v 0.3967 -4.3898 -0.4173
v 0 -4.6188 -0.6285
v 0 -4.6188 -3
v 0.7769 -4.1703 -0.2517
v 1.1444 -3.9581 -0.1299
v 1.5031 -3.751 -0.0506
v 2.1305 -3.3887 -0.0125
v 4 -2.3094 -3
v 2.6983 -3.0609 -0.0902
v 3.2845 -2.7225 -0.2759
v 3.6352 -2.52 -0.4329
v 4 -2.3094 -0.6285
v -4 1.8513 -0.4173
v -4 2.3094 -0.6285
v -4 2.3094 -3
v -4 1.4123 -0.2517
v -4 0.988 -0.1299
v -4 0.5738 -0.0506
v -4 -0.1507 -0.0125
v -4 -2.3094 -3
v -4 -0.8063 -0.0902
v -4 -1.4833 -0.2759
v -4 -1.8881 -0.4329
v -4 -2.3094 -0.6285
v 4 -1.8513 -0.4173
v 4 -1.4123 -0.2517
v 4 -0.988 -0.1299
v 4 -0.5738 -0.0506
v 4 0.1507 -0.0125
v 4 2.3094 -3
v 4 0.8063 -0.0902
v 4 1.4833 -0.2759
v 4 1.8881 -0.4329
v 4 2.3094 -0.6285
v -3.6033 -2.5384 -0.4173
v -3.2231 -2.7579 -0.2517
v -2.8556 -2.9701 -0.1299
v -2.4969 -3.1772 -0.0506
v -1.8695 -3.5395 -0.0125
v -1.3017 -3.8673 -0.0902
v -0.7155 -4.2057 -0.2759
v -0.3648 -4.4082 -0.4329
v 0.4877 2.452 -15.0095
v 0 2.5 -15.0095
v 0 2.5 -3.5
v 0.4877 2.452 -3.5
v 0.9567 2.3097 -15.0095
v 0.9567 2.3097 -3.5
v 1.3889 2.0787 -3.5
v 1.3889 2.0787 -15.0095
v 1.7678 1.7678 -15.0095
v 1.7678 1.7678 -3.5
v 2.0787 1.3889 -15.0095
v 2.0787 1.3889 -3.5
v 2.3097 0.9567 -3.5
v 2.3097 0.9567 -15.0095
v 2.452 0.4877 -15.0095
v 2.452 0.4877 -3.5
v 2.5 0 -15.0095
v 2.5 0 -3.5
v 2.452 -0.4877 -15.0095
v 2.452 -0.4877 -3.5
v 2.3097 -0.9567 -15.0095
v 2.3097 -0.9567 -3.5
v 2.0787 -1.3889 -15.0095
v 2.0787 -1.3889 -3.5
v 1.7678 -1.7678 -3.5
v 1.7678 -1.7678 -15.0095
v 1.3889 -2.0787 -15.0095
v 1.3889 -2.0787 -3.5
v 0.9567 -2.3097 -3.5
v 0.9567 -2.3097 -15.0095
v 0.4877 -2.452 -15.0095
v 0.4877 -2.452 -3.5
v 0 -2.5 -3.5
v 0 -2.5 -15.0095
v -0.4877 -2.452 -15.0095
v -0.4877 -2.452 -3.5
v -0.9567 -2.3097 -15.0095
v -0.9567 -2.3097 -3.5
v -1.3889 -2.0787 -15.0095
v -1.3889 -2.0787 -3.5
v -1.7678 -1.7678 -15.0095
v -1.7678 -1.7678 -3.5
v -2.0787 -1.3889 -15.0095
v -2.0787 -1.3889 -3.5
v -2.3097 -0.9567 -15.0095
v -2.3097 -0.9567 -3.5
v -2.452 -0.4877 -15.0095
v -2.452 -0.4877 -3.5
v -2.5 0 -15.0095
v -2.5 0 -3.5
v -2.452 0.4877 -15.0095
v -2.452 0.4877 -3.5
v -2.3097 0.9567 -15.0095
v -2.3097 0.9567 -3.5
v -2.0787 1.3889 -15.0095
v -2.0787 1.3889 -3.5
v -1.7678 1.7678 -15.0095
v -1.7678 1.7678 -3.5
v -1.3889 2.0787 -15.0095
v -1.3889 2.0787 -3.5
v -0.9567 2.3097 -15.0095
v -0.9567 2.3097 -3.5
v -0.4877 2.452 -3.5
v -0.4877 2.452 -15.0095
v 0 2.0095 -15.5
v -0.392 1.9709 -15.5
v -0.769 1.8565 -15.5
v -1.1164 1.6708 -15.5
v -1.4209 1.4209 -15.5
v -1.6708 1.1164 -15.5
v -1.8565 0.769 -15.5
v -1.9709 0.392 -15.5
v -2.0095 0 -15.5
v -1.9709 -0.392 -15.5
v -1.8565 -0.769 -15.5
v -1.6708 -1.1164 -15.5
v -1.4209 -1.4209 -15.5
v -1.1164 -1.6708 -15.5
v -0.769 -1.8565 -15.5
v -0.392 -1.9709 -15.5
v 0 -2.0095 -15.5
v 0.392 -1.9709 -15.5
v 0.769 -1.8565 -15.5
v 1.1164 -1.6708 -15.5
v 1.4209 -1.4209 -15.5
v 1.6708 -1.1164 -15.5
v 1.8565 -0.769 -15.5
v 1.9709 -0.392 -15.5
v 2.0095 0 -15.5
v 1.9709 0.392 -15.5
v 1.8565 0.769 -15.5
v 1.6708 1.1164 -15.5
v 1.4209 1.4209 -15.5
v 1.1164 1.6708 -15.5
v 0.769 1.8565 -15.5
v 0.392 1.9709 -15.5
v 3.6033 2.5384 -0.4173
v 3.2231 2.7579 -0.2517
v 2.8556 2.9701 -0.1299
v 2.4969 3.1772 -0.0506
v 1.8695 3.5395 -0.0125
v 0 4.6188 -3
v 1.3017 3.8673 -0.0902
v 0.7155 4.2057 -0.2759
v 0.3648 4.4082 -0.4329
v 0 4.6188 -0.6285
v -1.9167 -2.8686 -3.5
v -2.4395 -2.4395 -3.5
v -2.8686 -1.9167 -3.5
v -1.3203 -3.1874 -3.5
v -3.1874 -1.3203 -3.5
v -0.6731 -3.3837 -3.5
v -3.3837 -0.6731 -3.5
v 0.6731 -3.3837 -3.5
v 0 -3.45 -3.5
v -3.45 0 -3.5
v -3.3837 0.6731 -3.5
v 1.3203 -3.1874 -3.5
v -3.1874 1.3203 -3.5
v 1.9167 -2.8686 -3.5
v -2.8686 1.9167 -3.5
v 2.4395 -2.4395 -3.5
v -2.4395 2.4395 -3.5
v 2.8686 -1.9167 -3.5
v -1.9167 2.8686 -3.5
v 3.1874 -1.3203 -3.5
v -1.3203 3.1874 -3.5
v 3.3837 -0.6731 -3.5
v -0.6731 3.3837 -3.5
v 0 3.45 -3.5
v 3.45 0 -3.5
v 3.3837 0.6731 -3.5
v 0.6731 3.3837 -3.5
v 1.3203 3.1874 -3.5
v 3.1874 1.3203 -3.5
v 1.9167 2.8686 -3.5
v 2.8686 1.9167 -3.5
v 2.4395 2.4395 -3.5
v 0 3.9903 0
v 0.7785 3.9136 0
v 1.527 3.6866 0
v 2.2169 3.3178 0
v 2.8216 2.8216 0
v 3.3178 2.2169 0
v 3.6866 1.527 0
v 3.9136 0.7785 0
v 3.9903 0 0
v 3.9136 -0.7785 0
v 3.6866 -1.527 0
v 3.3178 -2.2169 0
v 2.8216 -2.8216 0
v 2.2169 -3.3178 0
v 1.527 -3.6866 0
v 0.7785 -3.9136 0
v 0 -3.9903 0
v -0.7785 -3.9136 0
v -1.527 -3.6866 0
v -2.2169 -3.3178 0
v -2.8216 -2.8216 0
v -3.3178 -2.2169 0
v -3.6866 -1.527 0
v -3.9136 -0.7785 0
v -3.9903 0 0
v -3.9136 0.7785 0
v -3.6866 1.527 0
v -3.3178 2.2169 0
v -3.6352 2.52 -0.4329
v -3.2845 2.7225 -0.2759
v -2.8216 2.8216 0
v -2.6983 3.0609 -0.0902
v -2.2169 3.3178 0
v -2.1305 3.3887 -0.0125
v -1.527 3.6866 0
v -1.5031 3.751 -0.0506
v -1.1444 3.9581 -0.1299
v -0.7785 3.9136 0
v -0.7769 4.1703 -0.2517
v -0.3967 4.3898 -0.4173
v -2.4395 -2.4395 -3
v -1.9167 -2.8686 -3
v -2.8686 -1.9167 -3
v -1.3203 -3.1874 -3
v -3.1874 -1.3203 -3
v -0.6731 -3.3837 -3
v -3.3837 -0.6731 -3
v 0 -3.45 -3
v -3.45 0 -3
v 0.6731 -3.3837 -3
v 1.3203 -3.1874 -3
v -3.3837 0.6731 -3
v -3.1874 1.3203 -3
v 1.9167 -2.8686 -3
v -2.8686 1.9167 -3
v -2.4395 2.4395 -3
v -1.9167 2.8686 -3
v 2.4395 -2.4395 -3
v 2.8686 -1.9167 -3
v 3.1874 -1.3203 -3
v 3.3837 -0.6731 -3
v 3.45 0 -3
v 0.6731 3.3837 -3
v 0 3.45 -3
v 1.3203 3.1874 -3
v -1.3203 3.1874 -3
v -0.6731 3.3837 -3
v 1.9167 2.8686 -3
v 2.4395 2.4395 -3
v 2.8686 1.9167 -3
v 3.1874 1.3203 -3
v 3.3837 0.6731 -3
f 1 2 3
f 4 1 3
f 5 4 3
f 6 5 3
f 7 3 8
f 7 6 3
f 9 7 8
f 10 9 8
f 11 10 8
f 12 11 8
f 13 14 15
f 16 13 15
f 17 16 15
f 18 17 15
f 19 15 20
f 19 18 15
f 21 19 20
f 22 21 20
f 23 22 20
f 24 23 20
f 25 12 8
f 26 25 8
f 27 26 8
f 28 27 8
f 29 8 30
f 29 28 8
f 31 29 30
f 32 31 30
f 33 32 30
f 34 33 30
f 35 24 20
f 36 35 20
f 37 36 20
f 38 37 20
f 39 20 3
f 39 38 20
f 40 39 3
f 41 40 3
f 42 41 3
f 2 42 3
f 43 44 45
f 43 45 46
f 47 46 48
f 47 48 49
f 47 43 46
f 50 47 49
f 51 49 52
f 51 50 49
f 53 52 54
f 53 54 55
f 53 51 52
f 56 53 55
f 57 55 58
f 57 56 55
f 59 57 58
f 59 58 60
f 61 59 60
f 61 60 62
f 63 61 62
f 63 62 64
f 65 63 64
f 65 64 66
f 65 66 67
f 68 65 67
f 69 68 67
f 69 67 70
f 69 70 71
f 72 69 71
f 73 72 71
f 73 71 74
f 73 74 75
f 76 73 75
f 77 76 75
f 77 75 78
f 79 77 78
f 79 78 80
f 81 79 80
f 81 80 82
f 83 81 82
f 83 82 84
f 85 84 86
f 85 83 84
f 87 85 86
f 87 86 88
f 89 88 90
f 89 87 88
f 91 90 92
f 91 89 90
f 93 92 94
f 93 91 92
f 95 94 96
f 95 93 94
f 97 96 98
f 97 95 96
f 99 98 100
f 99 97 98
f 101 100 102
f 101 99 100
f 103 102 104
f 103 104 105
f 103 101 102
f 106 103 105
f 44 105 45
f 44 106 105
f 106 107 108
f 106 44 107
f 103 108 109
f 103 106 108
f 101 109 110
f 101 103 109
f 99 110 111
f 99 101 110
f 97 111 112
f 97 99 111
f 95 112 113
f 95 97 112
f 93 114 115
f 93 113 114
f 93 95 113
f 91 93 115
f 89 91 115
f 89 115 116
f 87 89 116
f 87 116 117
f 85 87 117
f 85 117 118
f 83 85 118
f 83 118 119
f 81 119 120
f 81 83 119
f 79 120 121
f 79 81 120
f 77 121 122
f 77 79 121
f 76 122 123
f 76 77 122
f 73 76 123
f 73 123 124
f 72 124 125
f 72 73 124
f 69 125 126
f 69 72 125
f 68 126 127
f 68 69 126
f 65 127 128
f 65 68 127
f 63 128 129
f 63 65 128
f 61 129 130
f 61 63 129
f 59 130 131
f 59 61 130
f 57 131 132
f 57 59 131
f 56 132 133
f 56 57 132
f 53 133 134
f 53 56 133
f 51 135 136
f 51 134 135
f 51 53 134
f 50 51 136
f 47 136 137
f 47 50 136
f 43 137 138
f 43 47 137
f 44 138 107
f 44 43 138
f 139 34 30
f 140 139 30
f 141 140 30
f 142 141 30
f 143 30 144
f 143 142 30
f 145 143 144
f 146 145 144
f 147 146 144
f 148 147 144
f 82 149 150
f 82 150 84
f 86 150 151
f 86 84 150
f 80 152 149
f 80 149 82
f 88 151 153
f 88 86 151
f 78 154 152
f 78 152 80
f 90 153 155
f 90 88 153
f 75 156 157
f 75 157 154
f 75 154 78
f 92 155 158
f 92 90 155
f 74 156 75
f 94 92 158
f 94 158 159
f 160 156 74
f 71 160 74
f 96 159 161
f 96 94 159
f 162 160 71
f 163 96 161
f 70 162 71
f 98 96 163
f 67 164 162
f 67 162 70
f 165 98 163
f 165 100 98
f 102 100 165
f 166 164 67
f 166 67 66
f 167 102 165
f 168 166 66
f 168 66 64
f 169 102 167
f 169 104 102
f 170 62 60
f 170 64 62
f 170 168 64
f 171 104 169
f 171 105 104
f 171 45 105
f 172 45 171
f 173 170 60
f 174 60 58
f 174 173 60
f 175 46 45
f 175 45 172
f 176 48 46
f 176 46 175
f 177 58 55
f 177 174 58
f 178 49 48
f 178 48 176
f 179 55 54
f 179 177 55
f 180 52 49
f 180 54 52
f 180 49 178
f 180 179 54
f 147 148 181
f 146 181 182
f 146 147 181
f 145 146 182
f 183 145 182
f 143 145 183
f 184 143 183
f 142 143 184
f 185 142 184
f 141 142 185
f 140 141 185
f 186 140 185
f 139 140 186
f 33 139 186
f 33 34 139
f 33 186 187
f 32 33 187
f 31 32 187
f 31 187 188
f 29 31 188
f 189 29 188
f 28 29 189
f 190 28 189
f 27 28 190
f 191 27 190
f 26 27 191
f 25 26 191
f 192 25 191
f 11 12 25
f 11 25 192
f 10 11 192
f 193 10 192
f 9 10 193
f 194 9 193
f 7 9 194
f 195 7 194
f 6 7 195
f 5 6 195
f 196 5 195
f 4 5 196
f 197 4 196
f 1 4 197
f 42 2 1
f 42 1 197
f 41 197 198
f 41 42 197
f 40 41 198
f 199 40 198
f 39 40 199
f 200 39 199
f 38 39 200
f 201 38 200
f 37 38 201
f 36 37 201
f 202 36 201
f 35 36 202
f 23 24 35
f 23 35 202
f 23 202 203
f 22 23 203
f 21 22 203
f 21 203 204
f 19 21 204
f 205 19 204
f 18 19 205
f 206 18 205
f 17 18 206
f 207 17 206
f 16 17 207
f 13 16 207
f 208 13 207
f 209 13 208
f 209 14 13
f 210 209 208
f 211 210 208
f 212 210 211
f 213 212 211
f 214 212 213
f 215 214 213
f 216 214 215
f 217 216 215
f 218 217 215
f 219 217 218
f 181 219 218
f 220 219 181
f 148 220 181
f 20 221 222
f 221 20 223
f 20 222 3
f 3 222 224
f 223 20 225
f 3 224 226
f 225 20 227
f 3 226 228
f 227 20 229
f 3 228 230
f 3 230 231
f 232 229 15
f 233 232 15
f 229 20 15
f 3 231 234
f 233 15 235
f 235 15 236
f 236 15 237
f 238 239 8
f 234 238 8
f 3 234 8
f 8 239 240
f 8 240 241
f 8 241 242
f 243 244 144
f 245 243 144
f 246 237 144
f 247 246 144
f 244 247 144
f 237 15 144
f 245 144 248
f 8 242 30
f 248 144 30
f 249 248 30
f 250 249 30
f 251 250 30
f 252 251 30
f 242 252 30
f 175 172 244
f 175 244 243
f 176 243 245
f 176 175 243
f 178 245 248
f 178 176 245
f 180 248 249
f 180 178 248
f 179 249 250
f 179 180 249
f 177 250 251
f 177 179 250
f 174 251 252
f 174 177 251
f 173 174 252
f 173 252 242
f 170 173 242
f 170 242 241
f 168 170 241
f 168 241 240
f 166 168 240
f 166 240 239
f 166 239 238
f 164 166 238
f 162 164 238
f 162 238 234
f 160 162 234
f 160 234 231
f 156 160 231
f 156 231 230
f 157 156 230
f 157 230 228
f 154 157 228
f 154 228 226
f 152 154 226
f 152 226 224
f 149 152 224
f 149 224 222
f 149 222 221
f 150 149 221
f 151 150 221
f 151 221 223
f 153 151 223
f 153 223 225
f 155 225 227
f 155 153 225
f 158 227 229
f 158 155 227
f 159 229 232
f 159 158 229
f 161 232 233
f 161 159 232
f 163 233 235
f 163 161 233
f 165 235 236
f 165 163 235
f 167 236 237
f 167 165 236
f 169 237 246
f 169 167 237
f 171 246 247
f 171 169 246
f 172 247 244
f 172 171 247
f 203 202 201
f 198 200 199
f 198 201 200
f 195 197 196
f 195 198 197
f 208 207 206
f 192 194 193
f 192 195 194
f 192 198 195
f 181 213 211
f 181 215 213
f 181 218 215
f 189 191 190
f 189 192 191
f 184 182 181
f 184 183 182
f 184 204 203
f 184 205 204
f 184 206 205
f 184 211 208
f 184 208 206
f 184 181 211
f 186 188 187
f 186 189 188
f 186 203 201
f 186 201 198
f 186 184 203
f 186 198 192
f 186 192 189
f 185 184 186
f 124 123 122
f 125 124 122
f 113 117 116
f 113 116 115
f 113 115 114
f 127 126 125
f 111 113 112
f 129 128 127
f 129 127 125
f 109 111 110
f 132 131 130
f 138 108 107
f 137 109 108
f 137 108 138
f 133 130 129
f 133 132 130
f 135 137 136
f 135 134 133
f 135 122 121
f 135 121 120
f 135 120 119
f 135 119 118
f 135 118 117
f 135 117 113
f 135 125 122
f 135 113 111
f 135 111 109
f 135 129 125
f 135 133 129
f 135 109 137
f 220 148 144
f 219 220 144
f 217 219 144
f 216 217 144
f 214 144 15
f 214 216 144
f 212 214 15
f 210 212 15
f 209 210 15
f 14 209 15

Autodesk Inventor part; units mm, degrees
sketch "Sketch_1" plane through (0, 0, 0) normal (0, 0, 1) x (1, 0, 0)
  line L0 (-4, -2.3094) -> (0, -4.6188)
  line L1 (0, -4.6188) -> (4, -2.3094)
  line L2 (4, -2.3094) -> (4, 2.3094)
  line L3 (4, 2.3094) -> (0, 4.6188)
  line L4 (0, 4.6188) -> (-4, 2.3094)
  line L5 (-4, 2.3094) -> (-4, -2.3094)
extrude "Extrusion1" add sketch "Sketch_1" against normal blind 3
sketch "Sketch_2" plane through (0, 0, 0) normal (1, 0, 0) x (0, 0, -1)
  line L0 (3.5, 0) -> (3, 0)
  line L1 (3, 0) -> (3, 3.45)
  line L2 (3, 3.45) -> (3.5, 3.45)
  line L3 (3.5, 3.45) -> (3.5, 0)
  line L4 (3.5, 0) -> (3, 0)
revolve "Revolution1" add sketch "Sketch_2" angle 360 about axis through (0, 0, -3.5) along (0, 0, -1)
sketch "Sketch_3" plane through (0, 0, 0) normal (1, 0, 0) x (0, 0, -1)
  line L0 (15.5, 0) -> (3.5, 0)
  line L1 (3.5, 0) -> (3.5, 2.5)
  line L2 (3.5, 2.5) -> (15.0095, 2.5)
  line L3 (15.0095, 2.5) -> (15.5, 2.0095)
  line L4 (15.5, 2.0095) -> (15.5, 0)
  line L5 (15.5, 0) -> (3.5, 0)
revolve "Revolution2" add sketch "Sketch_3" angle 360 about axis through (0, 0, -15.5) along (0, 0, -1)
thread "Thread1" size "M5x0.8" class "6g" standard "ISO Metric profile" full length
sketch "Sketch_4" plane through (0, 0, 0) normal (1, 0, 0) x (0, 0, -1)
  line L0 (50, 0) -> (-50, 0)
  line L1 (-2, 3.9903) -> (0, 3.9903)
  line L2 (0, 3.9903) -> (0.6285, 4.6188)
  line L3 (0.6285, 4.6188) -> (0.6285, 6.6188)
  line L4 (0.6285, 6.6188) -> (-2, 6.6188)
  line L5 (-2, 6.6188) -> (-2, 3.9903)
revolve "Revolution3" cut sketch "Sketch_4" angle 360 about axis through (0, 0, -50) along (0, 0, -1)
ref_plane "schraube_st_XY" through (0, 0, -3.5) normal (0, 0, 1) x (1, 0, 0)
ref_plane "schraube_st_YZ" through (0, 0, -3.5) normal (1, 0, 0) x (0, 1, 0)
ref_plane "schraube_st_ZX" through (0, 0, -3.5) normal (0, 1, 0) x (0, 0, 1)
properties part number "61581400_5"
